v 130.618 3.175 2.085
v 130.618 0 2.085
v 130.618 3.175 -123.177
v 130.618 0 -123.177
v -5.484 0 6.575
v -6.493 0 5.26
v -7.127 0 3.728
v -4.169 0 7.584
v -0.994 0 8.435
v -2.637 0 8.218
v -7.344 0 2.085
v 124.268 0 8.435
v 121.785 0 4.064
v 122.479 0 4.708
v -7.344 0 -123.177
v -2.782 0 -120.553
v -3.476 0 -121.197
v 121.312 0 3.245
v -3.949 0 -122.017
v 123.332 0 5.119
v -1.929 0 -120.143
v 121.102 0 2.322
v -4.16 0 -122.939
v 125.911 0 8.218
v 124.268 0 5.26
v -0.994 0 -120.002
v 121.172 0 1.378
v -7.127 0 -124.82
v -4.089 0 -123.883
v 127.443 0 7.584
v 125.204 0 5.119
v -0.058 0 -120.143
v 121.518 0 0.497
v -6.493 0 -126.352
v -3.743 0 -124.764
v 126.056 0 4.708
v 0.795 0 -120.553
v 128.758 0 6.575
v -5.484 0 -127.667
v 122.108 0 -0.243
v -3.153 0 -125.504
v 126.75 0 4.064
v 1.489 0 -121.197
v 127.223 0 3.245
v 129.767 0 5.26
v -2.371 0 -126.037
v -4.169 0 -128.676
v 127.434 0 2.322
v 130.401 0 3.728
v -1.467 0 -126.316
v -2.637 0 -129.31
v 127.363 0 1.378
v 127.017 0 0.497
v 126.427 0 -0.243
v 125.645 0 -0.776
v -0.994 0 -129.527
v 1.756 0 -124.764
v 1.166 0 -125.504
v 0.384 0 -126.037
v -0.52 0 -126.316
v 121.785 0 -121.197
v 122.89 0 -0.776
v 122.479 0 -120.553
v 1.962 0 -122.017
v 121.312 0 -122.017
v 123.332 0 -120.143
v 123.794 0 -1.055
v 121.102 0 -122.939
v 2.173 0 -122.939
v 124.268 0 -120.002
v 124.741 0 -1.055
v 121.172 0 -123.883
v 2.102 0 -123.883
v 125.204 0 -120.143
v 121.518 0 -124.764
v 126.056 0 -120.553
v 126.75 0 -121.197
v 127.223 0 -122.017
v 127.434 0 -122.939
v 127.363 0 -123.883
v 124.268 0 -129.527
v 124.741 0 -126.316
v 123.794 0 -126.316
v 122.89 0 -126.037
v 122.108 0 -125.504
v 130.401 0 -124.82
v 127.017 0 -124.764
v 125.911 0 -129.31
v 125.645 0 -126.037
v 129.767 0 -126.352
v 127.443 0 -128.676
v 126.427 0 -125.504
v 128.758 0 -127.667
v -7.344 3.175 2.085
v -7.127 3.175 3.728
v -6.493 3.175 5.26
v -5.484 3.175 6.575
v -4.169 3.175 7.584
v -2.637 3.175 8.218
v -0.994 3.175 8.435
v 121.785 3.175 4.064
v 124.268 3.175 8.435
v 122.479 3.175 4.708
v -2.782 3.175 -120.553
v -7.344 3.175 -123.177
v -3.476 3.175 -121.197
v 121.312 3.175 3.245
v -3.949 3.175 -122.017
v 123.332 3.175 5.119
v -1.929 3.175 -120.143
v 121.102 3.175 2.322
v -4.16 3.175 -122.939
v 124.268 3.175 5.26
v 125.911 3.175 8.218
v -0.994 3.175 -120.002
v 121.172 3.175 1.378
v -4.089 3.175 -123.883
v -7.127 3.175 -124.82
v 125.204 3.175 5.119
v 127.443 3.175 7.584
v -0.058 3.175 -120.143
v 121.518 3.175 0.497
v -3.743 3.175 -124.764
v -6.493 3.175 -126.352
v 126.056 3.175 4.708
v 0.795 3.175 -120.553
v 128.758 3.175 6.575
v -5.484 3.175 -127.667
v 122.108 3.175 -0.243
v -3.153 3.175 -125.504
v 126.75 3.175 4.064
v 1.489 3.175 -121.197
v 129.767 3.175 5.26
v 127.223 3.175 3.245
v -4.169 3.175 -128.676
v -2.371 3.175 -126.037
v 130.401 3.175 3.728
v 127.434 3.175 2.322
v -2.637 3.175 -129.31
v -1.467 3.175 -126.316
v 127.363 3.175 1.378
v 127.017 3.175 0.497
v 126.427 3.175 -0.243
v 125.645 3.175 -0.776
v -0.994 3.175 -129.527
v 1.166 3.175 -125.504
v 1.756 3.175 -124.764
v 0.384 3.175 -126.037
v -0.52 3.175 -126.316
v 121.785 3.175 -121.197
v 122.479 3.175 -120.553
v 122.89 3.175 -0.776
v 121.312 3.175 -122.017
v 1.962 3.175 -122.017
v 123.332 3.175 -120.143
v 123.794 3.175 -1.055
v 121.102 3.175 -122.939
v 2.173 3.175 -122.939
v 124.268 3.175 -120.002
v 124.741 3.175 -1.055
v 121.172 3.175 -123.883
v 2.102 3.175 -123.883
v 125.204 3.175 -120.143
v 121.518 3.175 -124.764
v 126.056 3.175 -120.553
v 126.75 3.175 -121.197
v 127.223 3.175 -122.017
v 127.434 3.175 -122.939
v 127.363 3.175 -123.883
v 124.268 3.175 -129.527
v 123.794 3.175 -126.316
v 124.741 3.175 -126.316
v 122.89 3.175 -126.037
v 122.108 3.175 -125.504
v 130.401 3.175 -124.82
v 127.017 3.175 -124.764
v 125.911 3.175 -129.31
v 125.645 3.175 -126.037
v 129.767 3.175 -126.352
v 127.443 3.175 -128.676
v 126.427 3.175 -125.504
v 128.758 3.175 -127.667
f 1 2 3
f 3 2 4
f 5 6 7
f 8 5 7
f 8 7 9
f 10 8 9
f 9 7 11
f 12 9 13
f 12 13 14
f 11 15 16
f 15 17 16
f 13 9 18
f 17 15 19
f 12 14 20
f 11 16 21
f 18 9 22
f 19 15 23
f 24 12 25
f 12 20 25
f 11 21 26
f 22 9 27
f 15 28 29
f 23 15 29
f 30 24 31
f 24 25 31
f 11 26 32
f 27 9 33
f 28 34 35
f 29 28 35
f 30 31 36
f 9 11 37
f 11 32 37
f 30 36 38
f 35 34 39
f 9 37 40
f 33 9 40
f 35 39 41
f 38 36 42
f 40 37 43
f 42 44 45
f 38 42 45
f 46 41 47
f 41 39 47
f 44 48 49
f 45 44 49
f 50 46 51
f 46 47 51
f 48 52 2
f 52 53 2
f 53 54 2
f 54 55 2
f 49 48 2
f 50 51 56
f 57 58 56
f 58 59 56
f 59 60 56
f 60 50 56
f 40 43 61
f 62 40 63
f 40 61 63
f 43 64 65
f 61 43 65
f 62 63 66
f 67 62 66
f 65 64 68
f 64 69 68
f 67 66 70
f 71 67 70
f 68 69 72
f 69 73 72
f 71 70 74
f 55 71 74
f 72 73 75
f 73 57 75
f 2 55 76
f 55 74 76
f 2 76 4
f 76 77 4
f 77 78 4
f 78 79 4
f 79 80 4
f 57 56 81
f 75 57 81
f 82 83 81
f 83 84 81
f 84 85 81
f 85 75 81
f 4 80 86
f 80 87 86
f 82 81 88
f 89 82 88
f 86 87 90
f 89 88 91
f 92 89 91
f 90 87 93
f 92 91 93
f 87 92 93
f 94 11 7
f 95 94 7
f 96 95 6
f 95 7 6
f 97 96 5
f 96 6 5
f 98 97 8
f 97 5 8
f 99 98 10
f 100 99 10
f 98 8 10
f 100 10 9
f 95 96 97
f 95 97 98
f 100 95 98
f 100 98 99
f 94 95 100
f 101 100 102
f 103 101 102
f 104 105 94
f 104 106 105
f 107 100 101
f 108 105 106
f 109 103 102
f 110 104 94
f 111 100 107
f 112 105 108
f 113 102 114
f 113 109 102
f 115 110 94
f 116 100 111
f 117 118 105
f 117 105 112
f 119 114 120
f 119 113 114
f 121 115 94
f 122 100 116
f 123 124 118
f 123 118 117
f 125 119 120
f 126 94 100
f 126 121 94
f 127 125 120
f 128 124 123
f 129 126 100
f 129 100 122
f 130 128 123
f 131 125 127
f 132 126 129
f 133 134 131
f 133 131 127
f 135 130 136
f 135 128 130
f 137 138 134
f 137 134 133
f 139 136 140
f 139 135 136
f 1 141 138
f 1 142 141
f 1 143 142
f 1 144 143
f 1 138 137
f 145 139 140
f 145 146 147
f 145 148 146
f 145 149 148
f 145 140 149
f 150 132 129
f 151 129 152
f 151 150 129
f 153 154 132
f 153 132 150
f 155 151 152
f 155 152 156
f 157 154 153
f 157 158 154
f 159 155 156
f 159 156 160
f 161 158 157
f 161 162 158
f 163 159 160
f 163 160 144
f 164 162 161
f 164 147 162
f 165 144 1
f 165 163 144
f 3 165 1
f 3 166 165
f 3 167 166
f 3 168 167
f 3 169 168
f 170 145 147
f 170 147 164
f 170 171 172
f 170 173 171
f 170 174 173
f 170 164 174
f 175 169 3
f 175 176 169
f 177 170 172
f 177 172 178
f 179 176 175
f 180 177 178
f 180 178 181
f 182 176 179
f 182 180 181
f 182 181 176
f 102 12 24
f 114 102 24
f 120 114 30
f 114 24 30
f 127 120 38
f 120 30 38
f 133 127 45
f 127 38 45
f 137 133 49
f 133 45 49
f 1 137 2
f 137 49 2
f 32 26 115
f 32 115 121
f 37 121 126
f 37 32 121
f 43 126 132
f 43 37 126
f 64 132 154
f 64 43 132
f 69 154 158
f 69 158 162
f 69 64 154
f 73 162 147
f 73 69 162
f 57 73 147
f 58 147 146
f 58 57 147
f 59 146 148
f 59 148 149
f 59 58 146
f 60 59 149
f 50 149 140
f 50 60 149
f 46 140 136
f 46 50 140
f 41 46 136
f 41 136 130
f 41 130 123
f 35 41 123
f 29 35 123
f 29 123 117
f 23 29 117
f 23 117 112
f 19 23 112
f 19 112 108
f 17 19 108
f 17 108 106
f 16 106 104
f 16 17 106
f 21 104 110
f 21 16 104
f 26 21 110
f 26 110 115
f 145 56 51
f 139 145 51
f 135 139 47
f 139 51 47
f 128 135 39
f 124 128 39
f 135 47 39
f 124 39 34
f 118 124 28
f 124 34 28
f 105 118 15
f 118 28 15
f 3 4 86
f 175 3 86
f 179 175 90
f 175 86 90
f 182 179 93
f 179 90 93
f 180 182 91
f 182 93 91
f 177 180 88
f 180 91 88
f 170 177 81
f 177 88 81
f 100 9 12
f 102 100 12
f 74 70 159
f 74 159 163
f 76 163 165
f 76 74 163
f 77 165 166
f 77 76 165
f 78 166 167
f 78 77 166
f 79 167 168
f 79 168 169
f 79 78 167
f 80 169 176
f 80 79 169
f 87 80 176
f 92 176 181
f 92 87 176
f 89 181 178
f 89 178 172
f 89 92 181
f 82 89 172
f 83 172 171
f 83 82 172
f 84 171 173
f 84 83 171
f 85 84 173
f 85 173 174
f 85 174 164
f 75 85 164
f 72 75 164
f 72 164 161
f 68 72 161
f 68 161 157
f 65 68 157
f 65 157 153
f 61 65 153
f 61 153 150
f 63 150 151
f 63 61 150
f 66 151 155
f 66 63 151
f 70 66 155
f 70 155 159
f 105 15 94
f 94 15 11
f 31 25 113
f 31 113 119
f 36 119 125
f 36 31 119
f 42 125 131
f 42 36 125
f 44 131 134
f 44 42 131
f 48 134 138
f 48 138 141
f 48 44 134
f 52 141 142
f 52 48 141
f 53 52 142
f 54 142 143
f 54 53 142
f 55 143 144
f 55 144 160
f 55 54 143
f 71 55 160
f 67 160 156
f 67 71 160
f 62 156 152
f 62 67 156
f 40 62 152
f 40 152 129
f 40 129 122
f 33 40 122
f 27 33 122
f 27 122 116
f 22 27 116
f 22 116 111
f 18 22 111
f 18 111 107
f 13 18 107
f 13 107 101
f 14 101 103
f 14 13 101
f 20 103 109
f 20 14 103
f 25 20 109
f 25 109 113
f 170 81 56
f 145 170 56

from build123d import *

# Parameters (mm, degrees)
SKETCH1_R           = 3.175
BOSS_EXTRUDE1_DEPTH = 3.175


with BuildPart() as part:
    # Sketch1 → Boss-Extrude1 (new body)
    with BuildSketch(Plane(origin=(0, 0, 0), x_dir=(1, 0, 0), z_dir=(0, 1, 0))):
        with BuildLine():
            Line((-0.993506611, -8.434604242), (124.267660571, -8.434604242))
            ThreePointArc((124.267660571, -8.434604242), (128.757788632, -6.574732303), (130.617660571, -2.084604242))
            Line((130.617660571, -2.084604242), (130.617660571, 123.176562941))
            ThreePointArc((130.617660571, 123.176562941), (128.757788632, 127.666691001), (124.267660571, 129.526562941))
            Line((124.267660571, 129.526562941), (-0.993506611, 129.526562941))
            ThreePointArc((-0.993506611, 129.526562941), (-5.483634672, 127.666691001), (-7.343506611, 123.176562941))
            Line((-7.343506611, 123.176562941), (-7.343506611, -2.084604242))
            ThreePointArc((-7.343506611, -2.084604242), (-5.483634672, -6.574732303), (-0.993506611, -8.434604242))
        make_face()
        with Locations(Location((124.267660571, -2.084604242, 0), (0, 0, 270))):
            Circle(SKETCH1_R, mode=Mode.SUBTRACT)
        with Locations(Location((124.267660571, 123.176562941, 0), (0, 0, 270))):
            Circle(SKETCH1_R, mode=Mode.SUBTRACT)
        with Locations(Location((-0.993506611, 123.176562941, 0), (0, 0, 270))):
            Circle(SKETCH1_R, mode=Mode.SUBTRACT)
        with BuildLine():
            Line((20.247476788, 4.265395758), (117.917660571, 4.265395758))
            Line((117.917660571, 4.265395758), (117.917660571, 116.826562941))
            Line((117.917660571, 116.826562941), (5.356493389, 116.826562941))
            Line((5.356493389, 116.826562941), (5.356493389, 50.943180056))
            ThreePointArc((5.356493389, 50.943180056), (3.835119849, 46.819241828), (0, 44.671382498))
            Line((0, 44.671382498), (0, 0))
            Line((0, 0), (14.2494, 0))
            ThreePointArc((14.2494, 0), (16.56744533, 3.090322663), (20.247476788, 4.265395758))
        make_face(mode=Mode.SUBTRACT)
        with BuildLine():
            ThreePointArc((20.247476788, 4.265395758), (16.56744533, 3.090322663), (14.2494, 0))
            Line((14.2494, 0), (0, 0))
            Line((0, 0), (0, 44.671382498))
            ThreePointArc((0, 44.671382498), (3.835119849, 46.819241828), (5.356493389, 50.943180056))
            Line((5.356493389, 50.943180056), (5.356493389, 116.826562941))
            Line((5.356493389, 116.826562941), (117.917660571, 116.826562941))
            Line((117.917660571, 116.826562941), (117.917660571, 4.265395758))
            Line((117.917660571, 4.265395758), (20.247476788, 4.265395758))
        make_face()
    extrude(amount=BOSS_EXTRUDE1_DEPTH)


solid = part.part
